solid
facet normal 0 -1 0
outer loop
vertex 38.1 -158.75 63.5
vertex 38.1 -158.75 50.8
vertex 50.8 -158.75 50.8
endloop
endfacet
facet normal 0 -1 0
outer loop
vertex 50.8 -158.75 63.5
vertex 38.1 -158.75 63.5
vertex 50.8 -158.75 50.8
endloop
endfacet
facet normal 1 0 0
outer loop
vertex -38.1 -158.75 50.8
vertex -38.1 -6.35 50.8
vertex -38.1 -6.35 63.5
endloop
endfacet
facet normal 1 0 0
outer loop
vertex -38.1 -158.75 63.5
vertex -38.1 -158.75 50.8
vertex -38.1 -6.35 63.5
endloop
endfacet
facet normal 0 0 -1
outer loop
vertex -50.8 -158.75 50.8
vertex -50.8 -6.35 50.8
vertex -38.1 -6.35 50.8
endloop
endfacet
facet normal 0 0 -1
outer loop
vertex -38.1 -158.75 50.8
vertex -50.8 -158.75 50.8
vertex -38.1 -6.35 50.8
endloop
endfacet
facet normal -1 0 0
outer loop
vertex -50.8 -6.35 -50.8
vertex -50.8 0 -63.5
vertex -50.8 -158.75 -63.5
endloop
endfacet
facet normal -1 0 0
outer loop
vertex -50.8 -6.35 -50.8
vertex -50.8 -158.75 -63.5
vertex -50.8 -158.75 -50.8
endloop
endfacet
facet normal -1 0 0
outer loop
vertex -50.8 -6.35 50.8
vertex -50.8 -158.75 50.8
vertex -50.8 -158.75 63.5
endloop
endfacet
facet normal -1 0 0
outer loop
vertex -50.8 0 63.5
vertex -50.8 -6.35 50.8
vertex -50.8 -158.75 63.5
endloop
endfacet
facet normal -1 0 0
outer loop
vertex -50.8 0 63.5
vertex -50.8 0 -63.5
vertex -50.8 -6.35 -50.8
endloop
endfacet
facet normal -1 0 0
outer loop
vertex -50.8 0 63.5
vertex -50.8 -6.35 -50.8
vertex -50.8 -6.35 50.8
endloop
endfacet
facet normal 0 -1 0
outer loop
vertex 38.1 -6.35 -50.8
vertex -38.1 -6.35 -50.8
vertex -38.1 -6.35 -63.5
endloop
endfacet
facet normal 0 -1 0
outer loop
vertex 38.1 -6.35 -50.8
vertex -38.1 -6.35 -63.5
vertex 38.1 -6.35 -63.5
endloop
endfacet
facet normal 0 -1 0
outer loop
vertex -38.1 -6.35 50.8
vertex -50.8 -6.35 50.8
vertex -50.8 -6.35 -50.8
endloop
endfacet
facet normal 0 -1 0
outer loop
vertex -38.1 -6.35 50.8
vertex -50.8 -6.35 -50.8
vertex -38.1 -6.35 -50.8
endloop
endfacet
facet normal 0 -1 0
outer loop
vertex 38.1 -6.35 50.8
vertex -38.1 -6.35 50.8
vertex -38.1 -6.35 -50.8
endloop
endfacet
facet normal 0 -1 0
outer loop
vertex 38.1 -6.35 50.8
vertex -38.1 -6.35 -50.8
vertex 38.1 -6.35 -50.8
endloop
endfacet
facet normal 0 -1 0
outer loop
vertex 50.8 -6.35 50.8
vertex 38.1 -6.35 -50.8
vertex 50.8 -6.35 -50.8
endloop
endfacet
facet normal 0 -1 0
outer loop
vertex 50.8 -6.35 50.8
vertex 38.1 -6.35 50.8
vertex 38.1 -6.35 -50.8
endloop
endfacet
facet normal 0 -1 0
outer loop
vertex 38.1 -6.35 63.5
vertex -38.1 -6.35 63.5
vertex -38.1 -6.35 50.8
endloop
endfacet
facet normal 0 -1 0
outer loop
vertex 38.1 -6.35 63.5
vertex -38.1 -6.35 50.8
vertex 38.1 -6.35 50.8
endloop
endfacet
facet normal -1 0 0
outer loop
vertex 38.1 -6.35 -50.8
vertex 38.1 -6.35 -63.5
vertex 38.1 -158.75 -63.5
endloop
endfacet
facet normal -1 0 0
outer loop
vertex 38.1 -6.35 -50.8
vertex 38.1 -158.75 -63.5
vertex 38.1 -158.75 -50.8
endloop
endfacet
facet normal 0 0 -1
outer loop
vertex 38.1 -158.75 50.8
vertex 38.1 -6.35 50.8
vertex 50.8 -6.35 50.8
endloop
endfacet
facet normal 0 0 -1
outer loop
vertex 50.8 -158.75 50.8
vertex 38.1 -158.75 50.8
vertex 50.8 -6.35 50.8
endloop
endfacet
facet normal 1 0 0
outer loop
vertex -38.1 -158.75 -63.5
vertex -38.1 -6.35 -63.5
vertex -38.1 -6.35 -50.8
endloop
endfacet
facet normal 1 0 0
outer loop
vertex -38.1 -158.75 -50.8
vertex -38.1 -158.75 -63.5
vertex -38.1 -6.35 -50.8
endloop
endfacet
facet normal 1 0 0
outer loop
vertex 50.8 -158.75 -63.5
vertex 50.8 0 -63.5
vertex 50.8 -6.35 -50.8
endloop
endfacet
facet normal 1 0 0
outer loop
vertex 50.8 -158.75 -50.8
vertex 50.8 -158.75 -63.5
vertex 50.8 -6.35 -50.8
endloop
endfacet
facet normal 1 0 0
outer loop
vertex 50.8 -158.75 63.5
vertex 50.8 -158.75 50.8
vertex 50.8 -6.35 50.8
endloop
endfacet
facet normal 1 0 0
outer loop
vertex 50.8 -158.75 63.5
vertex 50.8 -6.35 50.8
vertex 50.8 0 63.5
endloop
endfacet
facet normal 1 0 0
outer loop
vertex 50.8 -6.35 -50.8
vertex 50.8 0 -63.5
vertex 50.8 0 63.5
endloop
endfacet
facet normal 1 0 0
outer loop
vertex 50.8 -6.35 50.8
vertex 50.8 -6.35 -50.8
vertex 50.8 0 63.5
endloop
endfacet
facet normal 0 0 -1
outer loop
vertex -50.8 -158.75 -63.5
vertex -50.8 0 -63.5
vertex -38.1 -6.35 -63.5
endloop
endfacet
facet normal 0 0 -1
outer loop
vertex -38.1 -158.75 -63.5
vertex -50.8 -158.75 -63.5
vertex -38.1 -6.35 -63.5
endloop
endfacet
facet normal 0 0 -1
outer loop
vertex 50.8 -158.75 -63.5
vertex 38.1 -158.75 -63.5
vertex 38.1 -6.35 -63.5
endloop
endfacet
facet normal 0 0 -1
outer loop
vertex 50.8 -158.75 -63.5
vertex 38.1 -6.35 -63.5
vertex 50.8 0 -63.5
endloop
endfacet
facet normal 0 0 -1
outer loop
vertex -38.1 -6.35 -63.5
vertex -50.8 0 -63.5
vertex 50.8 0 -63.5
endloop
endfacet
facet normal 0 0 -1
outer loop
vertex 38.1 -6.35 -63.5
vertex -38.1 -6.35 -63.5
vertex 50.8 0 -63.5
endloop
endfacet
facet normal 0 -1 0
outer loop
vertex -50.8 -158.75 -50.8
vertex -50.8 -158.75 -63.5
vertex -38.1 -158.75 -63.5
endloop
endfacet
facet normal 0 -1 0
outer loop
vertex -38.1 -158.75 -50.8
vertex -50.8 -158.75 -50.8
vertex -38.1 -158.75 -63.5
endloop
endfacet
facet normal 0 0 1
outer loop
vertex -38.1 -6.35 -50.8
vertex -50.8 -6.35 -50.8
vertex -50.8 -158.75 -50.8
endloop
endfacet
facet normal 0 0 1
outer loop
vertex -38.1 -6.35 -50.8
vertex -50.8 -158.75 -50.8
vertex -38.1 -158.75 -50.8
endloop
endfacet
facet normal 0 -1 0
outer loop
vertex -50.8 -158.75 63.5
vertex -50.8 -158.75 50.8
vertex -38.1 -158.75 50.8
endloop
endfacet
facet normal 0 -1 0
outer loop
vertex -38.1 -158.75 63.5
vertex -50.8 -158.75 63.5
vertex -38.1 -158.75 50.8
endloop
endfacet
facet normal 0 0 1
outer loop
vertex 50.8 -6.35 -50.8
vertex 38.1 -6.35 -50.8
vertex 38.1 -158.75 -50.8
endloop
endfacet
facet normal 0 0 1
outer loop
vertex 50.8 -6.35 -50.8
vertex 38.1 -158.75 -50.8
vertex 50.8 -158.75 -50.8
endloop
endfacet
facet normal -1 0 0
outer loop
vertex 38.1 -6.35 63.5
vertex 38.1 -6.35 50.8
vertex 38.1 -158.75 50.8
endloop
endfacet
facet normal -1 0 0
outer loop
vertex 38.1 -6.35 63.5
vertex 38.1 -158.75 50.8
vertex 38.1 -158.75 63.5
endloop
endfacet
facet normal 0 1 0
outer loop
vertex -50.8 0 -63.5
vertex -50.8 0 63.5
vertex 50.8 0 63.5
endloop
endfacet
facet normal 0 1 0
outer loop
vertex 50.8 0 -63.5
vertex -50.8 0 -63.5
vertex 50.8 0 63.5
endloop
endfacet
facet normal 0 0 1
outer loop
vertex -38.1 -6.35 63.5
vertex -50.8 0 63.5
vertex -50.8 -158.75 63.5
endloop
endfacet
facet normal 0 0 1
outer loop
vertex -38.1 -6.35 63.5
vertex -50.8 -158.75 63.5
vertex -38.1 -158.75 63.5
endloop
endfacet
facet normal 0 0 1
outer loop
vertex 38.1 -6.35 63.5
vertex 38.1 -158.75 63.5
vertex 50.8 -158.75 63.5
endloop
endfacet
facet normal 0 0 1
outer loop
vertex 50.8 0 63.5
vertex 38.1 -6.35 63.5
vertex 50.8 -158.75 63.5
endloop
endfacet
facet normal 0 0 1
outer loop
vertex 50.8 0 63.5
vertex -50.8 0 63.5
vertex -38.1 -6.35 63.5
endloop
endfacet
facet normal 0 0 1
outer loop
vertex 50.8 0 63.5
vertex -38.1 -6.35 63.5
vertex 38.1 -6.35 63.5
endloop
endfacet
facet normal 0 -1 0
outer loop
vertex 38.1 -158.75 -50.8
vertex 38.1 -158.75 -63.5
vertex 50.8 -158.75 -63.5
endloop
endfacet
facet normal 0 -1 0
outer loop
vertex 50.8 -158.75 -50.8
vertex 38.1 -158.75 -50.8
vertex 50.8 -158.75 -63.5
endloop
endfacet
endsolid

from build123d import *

# Parameters (mm, degrees)
F0_W     = 101.6
F0_H     = 127
F1_DEPTH = 6.35
F2_W     = 12.7
F2_H     = 12.7
F3_DEPTH = 152.4


with BuildPart() as f1:
    # F0 (on Front) → F1 (new body)
    with BuildSketch(Plane.XZ):
        Rectangle(F0_W, F0_H)
    extrude(amount=F1_DEPTH)

    # F2 (on face) → F3 (join)
    with BuildSketch(Plane.XZ.offset(6.35)):
        with Locations((-44.45, 57.15)):
            Rectangle(F2_W, F2_H)
        with Locations((-44.45, -57.15)):
            Rectangle(F2_W, F2_H)
        with Locations((44.45, -57.15)):
            Rectangle(F2_W, F2_H)
        with Locations((44.45, 57.15)):
            Rectangle(F2_W, F2_H)
    extrude(amount=F3_DEPTH)


solid = f1.part
